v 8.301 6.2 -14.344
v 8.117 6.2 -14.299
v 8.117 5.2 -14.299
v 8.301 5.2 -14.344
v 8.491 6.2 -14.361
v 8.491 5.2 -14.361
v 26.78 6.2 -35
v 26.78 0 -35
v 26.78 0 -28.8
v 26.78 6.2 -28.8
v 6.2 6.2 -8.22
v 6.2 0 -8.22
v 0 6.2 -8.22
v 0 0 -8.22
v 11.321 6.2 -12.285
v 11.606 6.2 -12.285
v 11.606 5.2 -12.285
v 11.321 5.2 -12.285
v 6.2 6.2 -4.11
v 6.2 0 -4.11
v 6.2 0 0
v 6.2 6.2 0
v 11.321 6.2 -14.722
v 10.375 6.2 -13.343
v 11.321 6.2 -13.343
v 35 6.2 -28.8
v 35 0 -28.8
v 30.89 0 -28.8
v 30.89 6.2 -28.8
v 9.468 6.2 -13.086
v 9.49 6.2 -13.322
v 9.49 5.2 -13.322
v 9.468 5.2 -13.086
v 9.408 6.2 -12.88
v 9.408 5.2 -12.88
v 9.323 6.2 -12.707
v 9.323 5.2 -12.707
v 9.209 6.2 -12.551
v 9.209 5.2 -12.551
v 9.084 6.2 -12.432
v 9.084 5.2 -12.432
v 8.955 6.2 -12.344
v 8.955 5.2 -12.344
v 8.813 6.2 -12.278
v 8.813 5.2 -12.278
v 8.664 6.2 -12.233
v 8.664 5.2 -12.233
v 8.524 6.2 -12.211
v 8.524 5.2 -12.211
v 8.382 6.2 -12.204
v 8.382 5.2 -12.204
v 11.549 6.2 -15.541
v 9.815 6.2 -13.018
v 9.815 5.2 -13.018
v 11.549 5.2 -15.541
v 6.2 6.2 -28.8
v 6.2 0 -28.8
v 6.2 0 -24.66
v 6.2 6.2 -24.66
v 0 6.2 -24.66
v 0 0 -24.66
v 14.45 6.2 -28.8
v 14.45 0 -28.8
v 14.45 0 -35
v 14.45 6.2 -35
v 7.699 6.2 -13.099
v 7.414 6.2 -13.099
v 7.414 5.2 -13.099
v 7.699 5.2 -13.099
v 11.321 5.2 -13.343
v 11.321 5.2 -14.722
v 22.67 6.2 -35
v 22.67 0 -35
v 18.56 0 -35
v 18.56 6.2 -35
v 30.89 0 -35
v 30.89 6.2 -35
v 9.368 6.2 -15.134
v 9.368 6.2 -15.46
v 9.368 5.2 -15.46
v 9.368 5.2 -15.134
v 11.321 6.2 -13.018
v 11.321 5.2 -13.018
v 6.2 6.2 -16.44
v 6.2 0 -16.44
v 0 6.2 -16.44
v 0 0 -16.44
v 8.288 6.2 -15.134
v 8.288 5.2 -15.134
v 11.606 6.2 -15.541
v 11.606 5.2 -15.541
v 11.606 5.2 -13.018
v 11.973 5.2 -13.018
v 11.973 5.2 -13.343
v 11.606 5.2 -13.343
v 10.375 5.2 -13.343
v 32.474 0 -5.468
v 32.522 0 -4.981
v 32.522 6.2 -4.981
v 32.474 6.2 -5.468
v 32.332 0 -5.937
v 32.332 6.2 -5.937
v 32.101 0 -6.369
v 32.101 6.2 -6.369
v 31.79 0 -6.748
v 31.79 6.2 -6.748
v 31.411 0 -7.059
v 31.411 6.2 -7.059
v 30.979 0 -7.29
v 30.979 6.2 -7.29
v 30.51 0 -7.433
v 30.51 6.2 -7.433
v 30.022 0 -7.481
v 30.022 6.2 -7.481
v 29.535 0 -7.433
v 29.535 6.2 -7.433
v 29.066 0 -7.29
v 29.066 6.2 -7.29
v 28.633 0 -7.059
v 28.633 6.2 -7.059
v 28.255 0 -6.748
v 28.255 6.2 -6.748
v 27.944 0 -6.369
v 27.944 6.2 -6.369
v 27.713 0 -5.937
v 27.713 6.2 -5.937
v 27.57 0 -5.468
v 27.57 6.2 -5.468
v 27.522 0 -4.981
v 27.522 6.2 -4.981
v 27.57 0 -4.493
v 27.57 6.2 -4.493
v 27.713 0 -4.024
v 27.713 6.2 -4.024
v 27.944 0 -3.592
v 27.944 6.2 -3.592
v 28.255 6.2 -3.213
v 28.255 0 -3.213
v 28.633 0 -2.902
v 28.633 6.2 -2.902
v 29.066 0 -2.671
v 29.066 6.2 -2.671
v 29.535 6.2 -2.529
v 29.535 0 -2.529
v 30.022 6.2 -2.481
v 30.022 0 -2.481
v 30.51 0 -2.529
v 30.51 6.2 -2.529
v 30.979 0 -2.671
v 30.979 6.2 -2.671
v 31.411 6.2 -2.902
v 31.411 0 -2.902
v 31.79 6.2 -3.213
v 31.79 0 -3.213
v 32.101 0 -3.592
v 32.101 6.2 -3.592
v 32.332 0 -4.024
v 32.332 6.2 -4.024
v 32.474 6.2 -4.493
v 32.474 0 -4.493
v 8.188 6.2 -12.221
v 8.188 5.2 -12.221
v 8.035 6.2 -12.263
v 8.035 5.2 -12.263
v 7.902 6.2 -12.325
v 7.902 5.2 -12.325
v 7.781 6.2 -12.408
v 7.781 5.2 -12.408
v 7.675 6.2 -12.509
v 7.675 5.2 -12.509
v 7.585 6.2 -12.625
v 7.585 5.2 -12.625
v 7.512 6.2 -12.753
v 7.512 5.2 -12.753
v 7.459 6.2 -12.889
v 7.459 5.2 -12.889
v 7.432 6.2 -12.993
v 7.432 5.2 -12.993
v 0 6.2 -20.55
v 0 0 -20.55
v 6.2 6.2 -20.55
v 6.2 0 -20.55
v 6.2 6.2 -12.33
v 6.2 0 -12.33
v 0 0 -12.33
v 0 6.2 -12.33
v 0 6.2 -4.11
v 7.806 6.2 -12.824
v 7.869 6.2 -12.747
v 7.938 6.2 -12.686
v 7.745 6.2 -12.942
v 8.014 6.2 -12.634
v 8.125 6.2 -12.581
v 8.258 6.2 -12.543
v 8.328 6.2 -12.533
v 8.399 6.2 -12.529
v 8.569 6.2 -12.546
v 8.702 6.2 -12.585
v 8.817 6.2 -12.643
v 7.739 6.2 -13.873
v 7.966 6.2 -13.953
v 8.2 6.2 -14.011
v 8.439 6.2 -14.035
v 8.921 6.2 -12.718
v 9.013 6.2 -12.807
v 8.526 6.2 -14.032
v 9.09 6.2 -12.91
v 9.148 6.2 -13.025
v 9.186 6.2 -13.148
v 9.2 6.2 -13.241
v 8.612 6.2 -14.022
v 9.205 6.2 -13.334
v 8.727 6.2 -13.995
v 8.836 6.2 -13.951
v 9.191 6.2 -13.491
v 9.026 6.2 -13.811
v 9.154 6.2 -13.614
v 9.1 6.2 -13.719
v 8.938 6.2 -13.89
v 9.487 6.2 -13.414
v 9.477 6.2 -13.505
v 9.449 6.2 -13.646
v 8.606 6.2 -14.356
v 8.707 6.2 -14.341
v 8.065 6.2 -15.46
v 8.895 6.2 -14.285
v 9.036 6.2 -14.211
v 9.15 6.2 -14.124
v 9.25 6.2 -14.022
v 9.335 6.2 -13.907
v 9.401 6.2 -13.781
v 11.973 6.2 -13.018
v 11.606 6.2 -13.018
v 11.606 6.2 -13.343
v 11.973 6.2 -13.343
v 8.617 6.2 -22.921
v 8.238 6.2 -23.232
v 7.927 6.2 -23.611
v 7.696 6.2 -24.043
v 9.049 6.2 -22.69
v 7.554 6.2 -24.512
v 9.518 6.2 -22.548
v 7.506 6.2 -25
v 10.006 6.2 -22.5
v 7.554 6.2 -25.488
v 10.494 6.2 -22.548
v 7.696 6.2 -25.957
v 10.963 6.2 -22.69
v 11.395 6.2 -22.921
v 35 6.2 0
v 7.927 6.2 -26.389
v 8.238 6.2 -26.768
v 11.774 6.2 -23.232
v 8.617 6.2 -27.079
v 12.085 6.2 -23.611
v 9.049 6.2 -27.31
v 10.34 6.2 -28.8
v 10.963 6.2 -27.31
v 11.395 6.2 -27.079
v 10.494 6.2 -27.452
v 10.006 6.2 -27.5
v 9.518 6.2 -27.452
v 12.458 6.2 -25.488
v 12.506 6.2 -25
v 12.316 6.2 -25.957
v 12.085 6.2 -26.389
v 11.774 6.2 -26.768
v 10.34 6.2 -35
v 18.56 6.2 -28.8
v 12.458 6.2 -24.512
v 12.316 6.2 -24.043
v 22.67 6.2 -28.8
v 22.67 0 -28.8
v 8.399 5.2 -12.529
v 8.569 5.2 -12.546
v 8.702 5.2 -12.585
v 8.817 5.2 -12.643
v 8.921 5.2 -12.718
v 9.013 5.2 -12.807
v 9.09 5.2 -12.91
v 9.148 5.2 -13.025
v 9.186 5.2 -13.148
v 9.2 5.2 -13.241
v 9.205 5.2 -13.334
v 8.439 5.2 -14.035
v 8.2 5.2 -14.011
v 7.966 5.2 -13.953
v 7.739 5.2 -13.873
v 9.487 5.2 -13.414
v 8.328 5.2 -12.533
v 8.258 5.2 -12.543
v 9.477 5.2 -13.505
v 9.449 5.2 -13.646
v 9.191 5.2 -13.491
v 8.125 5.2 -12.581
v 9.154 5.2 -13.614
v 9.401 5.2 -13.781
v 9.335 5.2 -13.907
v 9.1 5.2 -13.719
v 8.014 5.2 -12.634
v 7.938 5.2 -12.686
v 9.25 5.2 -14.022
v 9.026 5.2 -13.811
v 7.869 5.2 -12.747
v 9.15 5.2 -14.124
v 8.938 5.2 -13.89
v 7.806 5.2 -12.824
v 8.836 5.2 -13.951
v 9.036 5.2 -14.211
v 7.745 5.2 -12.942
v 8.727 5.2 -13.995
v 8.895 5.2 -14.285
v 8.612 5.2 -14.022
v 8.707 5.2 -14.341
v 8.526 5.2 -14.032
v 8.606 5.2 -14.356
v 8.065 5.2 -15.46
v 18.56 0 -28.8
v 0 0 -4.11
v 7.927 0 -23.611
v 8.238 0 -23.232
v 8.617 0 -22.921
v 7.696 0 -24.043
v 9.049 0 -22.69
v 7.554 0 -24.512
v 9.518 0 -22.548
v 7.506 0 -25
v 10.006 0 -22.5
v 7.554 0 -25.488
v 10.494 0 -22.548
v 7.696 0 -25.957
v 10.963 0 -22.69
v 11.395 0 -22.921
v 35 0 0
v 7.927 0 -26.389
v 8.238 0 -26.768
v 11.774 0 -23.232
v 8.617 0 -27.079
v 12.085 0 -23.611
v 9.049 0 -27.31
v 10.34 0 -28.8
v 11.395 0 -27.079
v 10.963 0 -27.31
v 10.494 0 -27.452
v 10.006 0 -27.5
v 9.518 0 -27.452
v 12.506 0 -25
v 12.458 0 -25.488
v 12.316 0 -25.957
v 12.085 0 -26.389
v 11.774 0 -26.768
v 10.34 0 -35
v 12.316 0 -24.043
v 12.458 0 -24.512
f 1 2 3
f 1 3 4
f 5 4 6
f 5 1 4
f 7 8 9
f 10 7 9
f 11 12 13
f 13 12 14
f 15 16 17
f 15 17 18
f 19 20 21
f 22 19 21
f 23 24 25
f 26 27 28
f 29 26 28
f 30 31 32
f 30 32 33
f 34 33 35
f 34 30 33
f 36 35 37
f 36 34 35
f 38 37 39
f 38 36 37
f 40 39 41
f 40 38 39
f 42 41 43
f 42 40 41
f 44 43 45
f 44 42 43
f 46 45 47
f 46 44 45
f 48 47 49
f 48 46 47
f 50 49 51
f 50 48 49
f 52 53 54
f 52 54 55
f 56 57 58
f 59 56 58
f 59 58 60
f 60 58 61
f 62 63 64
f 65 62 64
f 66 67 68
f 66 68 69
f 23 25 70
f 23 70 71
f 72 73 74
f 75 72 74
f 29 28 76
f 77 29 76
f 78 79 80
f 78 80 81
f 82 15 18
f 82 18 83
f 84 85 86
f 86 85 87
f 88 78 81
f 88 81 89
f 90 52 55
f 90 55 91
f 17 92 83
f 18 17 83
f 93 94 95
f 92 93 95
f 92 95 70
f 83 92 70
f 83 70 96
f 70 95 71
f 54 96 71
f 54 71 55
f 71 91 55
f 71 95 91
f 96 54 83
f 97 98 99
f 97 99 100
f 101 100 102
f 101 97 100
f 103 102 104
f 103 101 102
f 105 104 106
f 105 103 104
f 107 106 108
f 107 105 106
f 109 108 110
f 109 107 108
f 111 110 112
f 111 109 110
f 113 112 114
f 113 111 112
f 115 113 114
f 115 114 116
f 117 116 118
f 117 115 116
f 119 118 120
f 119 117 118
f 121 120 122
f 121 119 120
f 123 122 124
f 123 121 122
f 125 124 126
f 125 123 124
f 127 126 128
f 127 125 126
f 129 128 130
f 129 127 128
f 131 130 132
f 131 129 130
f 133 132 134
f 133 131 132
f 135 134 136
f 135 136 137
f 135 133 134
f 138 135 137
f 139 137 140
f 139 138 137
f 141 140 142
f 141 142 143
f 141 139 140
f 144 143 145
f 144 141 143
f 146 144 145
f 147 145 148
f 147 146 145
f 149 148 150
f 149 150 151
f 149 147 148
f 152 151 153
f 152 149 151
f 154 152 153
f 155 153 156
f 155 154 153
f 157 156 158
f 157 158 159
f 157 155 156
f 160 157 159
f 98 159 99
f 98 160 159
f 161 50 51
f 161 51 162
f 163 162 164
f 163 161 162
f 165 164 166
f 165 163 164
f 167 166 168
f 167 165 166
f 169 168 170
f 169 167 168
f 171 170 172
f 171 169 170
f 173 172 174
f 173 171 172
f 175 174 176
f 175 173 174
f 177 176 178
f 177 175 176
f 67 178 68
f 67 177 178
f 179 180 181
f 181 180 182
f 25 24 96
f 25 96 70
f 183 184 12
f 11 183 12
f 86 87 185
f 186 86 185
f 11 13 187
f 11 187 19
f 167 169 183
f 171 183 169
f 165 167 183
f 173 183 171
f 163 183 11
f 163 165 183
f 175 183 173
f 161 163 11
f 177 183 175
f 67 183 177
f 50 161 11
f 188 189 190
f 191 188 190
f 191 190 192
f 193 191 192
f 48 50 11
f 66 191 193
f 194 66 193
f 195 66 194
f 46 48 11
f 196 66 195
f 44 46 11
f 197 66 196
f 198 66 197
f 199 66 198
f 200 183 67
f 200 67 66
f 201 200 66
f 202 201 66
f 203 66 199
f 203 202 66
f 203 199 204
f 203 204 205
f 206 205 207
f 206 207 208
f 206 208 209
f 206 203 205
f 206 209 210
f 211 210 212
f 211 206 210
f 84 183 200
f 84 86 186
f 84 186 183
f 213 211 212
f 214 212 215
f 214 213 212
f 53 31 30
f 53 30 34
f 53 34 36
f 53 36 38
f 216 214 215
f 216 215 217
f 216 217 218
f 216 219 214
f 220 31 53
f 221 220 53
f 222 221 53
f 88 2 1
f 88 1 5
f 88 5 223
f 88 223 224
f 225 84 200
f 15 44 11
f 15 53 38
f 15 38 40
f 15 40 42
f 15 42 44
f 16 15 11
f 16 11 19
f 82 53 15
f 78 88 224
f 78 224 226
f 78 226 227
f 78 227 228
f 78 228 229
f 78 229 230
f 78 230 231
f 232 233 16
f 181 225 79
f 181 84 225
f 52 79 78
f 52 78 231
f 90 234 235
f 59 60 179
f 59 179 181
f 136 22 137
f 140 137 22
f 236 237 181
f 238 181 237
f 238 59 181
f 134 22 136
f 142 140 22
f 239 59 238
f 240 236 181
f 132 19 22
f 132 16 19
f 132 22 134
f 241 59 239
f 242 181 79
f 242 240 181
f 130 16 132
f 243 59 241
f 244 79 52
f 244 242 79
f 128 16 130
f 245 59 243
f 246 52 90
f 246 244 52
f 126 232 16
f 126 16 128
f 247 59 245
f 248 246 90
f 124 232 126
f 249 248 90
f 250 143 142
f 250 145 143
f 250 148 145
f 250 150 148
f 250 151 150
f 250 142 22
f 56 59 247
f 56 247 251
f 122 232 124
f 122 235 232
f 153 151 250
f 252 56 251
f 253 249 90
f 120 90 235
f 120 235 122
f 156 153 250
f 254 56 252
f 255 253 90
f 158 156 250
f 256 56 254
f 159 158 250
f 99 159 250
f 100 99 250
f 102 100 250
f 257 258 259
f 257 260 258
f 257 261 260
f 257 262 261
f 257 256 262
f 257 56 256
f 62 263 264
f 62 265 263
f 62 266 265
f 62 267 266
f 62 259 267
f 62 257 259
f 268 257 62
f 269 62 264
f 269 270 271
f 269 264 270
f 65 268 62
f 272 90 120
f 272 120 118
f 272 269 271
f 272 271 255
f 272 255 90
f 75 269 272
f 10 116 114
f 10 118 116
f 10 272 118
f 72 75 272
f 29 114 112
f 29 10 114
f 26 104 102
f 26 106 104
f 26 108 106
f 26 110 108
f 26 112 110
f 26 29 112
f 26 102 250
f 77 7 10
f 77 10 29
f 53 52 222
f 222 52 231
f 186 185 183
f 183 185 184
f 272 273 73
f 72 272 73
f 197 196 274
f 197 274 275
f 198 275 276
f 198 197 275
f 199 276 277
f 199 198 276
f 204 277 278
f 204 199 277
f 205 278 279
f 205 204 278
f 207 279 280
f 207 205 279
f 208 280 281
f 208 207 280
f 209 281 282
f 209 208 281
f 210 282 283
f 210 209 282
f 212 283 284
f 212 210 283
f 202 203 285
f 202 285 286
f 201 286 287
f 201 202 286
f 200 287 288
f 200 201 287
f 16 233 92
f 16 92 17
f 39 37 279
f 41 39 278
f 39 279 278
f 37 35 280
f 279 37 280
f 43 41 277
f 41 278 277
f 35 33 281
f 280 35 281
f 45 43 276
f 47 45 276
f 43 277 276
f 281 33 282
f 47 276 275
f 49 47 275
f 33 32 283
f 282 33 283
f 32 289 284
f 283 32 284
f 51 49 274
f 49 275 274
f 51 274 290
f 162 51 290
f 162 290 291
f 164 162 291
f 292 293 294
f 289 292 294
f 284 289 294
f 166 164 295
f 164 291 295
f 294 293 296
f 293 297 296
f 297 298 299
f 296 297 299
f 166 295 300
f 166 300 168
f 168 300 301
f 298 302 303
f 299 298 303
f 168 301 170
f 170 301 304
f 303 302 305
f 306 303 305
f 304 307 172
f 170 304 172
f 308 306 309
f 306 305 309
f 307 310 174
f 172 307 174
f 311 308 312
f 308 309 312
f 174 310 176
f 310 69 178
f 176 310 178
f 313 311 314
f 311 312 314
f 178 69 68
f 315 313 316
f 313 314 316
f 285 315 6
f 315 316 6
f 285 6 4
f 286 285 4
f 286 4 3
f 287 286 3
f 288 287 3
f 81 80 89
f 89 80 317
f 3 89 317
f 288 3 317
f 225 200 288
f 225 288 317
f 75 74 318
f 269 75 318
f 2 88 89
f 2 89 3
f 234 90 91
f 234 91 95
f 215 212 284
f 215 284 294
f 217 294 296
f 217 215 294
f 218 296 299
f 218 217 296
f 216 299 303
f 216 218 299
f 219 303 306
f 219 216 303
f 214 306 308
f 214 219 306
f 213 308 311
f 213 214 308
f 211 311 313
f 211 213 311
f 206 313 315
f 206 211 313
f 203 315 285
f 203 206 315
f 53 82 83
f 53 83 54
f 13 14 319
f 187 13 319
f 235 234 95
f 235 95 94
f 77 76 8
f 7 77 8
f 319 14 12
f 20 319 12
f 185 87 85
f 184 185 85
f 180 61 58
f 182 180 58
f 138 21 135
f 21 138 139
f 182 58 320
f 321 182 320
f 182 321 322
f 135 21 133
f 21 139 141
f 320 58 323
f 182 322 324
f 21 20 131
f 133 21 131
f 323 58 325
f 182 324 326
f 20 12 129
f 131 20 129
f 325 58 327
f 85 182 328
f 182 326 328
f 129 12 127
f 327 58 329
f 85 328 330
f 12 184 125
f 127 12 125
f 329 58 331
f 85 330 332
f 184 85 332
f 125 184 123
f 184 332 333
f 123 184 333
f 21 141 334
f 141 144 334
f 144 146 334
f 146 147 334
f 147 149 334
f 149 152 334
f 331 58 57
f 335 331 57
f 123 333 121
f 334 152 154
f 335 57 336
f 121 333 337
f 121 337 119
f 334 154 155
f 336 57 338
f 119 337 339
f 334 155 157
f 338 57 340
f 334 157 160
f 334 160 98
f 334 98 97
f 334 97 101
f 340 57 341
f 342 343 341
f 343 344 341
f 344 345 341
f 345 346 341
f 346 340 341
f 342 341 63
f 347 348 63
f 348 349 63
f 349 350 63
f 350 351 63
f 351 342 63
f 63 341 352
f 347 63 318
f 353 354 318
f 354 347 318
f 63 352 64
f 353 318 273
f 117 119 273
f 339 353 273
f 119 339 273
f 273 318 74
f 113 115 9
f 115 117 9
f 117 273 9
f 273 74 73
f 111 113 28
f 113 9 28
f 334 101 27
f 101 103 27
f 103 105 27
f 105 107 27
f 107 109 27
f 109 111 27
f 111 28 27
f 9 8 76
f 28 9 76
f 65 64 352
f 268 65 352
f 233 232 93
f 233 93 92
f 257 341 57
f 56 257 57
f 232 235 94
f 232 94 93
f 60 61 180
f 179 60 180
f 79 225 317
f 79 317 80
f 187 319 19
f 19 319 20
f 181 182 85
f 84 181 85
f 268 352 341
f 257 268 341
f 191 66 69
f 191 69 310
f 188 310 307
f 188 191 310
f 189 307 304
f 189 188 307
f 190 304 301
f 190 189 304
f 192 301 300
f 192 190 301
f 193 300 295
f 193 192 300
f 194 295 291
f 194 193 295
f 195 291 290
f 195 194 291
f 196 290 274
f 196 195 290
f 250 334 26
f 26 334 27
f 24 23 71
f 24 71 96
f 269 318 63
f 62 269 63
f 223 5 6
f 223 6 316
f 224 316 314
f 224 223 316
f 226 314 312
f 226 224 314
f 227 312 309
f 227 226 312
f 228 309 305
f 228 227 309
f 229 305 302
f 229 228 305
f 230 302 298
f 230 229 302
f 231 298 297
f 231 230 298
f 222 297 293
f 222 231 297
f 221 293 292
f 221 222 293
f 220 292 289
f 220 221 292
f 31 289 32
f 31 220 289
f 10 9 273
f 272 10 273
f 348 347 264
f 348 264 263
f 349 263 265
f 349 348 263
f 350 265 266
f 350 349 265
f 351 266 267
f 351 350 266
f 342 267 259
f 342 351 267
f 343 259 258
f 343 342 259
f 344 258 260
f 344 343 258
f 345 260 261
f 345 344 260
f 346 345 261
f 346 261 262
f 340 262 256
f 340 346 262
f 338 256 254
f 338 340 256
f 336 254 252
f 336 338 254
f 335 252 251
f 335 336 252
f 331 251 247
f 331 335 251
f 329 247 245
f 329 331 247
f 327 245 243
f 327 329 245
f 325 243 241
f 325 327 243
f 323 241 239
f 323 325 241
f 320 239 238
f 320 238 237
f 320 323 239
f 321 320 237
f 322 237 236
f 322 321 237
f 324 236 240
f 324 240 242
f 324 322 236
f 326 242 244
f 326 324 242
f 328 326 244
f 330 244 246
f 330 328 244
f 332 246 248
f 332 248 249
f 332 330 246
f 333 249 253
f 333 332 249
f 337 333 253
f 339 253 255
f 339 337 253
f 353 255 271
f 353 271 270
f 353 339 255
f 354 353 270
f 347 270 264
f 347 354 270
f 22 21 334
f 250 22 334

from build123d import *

# Parameters (mm, degrees)
SKETCH1_R           = 2.5
BOSS_EXTRUDE1_DEPTH = 6.2
CUT_EXTRUDE1_DEPTH  = 1


with BuildPart() as part:
    # Sketch1 → Boss-Extrude1 (new body)
    with BuildSketch(Plane(origin=(0, 0, 0), x_dir=(1, 0, 0), z_dir=(0, 1, 0))):
        Polygon((0, 24.66), (0, 20.55), (6.2, 20.55), (6.2, 16.44), (0, 16.44), (0, 12.33), (6.2, 12.33), (6.2, 8.22), (0, 8.22), (0, 4.11), (6.2, 4.11), (6.2, 0), (17, 0), (35, 0), (35, 18), (35, 28.8), (30.89, 28.8), (30.89, 35), (26.78, 35), (26.78, 28.8), (22.67, 28.8), (22.67, 35), (18.56, 35), (18.56, 28.8), (14.45, 28.8), (14.45, 35), (10.34, 35), (10.34, 28.8), (6.2, 28.8), (6.2, 24.66), align=None)
        with Locations((10.006, 25)):
            Circle(SKETCH1_R, mode=Mode.SUBTRACT)
        with Locations((30.02235364, 4.980572344)):
            Circle(SKETCH1_R, mode=Mode.SUBTRACT)
    extrude(amount=BOSS_EXTRUDE1_DEPTH)

    # Sketch2 → Cut-Extrude1 (cut)
    with BuildSketch(Plane(origin=(0, 6.2, 0), x_dir=(1, 0, 0), z_dir=(0, 1, 0))):
        with BuildLine():
            Line((9.367624272, 15.46006193), (9.367624272, 15.134420905))
            Line((9.367624272, 15.134420905), (8.28766634, 15.134420905))
            Line((8.28766634, 15.134420905), (8.116577598, 14.299329759))
            add(Edge.make_bspline(
                [(8.116577598, 14.299329759), (8.150192569, 14.308610077), (8.215316261, 14.326589225), (8.311436992, 14.346551603), (8.40268849, 14.358585256), (8.461902576, 14.360228373), (8.490555963, 14.361023469)],
                knots=[0, 0, 0, 0, 0.000104595, 0.000202637, 0.000294305, 0.000380252, 0.000380252, 0.000380252, 0.000380252], degree=3))
            add(Edge.make_bspline(
                [(8.490555963, 14.361023469), (8.526010498, 14.360256084), (8.595722973, 14.358747215), (8.697721161, 14.344258466), (8.795087428, 14.321452972), (8.88761815, 14.289593641), (8.975484506, 14.248854097), (9.05787808, 14.197963437), (9.136035615, 14.138515344), (9.208554968, 14.070166655), (9.274344876, 13.994944902), (9.332189738, 13.914065976), (9.381322945, 13.828315883), (9.420838773, 13.736875331), (9.452393133, 13.640755241), (9.4733953, 13.538944256), (9.487380458, 13.432402033), (9.488942908, 13.359554316), (9.489739657, 13.322406682)],
                knots=[0, 0, 0, 0, 0.000106308, 0.000209029, 0.000308378, 0.000405929, 0.000502102, 0.000598312, 0.00069588, 0.000796219, 0.000896736, 0.000995218, 0.001094066, 0.001192613, 0.001293582, 0.001396995, 0.001504047, 0.001615439, 0.001615439, 0.001615439, 0.001615439], degree=3))
            add(Edge.make_bspline(
                [(9.489739657, 13.322406682), (9.489136339, 13.296532954), (9.487937855, 13.245135158), (9.481843137, 13.168804347), (9.470108594, 13.094089491), (9.454353587, 13.020980679), (9.433904394, 12.94961632), (9.409149323, 12.879792148), (9.378854356, 12.811942755), (9.345624465, 12.745426146), (9.308208017, 12.681746072), (9.266680371, 12.622193063), (9.222805961, 12.56587375), (9.17559699, 12.51339215), (9.124614659, 12.465093126), (9.070476403, 12.420690042), (9.013614223, 12.379431978), (8.953148396, 12.342993687), (8.890426286, 12.309463005), (8.824542118, 12.281955225), (8.756995625, 12.257362103), (8.686814631, 12.237759175), (8.614158101, 12.222398929), (8.538906269, 12.211966241), (8.461453804, 12.204367616), (8.4089529, 12.203891949), (8.382432966, 12.203651674)],
                knots=[0, 0, 0, 0, 7.7636e-05, 0.000154223, 0.000229512, 0.000304362, 0.000378447, 0.000452077, 0.000526407, 0.000601214, 0.00067506, 0.000747747, 0.00081887, 0.000889121, 0.000959302, 0.001029336, 0.001099058, 0.00116985, 0.001240974, 0.00131221, 0.00138383, 0.001456517, 0.001530612, 0.001606437, 0.001684346, 0.001763871, 0.001763871, 0.001763871, 0.001763871], degree=3))
            add(Edge.make_bspline(
                [(8.382432966, 12.203651674), (8.350797102, 12.204278363), (8.288557277, 12.205511299), (8.197370763, 12.218409496), (8.109636799, 12.236882477), (8.026061636, 12.264673951), (7.945896275, 12.299496711), (7.870219953, 12.343507809), (7.797098999, 12.393381711), (7.729505937, 12.452237459), (7.666771462, 12.516568114), (7.610613415, 12.586379688), (7.560599385, 12.660519968), (7.517530286, 12.739349008), (7.480792795, 12.822659675), (7.451932056, 12.910764112), (7.428638119, 13.003201972), (7.418783445, 13.066841228), (7.413778118, 13.099164495)],
                knots=[0, 0, 0, 0, 9.4843e-05, 0.000186593, 0.000275792, 0.000363484, 0.000450342, 0.000537514, 0.000625728, 0.000715478, 0.000805885, 0.000894984, 0.00098389, 0.001073836, 0.001164117, 0.001256635, 0.001351658, 0.001449737, 0.001449737, 0.001449737, 0.001449737], degree=3))
            Line((7.413778118, 13.099164495), (7.698714016, 13.099164495))
            add(Edge.make_bspline(
                [(7.698714016, 13.099164495), (7.705724921, 13.068887284), (7.719200271, 13.010692804), (7.748778343, 12.928930802), (7.784942388, 12.856069792), (7.827944904, 12.791145956), (7.87924386, 12.73453208), (7.93778127, 12.684079459), (8.003410991, 12.638563449), (8.076339135, 12.600624224), (8.153276714, 12.56826757), (8.233801254, 12.546721389), (8.315720197, 12.531571293), (8.371127004, 12.530054768), (8.398969424, 12.5292927)],
                knots=[0, 0, 0, 0, 9.3172e-05, 0.000179081, 0.000260145, 0.000336703, 0.000411917, 0.000488562, 0.000568128, 0.000650923, 0.00073478, 0.000817953, 0.000900557, 0.000983994, 0.000983994, 0.000983994, 0.000983994], degree=3))
            add(Edge.make_bspline(
                [(8.398969424, 12.5292927), (8.426146013, 12.530037262), (8.479656939, 12.531503313), (8.558407269, 12.542787274), (8.634437519, 12.560165928), (8.706997478, 12.586173582), (8.777356875, 12.617782719), (8.843735938, 12.658345681), (8.908054976, 12.705027269), (8.968314783, 12.758509355), (9.023504855, 12.817446149), (9.072269336, 12.880472071), (9.112888394, 12.947706638), (9.147118621, 13.017985856), (9.173111256, 13.092079975), (9.191654146, 13.169641756), (9.202542635, 13.250862773), (9.204040492, 13.306261362), (9.204803759, 13.334491017)],
                knots=[0, 0, 0, 0, 8.15e-05, 0.000160473, 0.000238226, 0.000315066, 0.000391338, 0.000469218, 0.000547964, 0.000629516, 0.000710512, 0.000789892, 0.000868102, 0.000945761, 0.001024012, 0.00110315, 0.001184644, 0.001269321, 0.001269321, 0.001269321, 0.001269321], degree=3))
            add(Edge.make_bspline(
                [(9.204803759, 13.334491017), (9.204206424, 13.359959735), (9.203037226, 13.409811125), (9.193484495, 13.482744691), (9.176868384, 13.551753808), (9.153805293, 13.61717172), (9.124523168, 13.679060129), (9.088739728, 13.737482905), (9.045783431, 13.791670025), (8.996714361, 13.841646841), (8.942958852, 13.887770406), (8.883592028, 13.927089685), (8.819856238, 13.960167667), (8.752519387, 13.988713637), (8.6799798, 14.009215742), (8.603673998, 14.024608038), (8.522777984, 14.033511974), (8.46746886, 14.034747402), (8.439038535, 14.035382443)],
                knots=[0, 0, 0, 0, 7.6388e-05, 0.000149519, 0.000220172, 0.000288967, 0.000357247, 0.000425206, 0.000494043, 0.000564207, 0.000635056, 0.000706145, 0.000777268, 0.000850264, 0.000925136, 0.001002969, 0.001083601, 0.001168886, 0.001168886, 0.001168886, 0.001168886], degree=3))
            add(Edge.make_bspline(
                [(8.439038535, 14.035382443), (8.414428721, 14.034855764), (8.363615699, 14.033768305), (8.28567142, 14.025761412), (8.203763929, 14.012844338), (8.118207208, 13.995076813), (8.028744318, 13.971825765), (7.935564055, 13.943963325), (7.838470499, 13.910651226), (7.77304942, 13.885494147), (7.739419144, 13.87256193)],
                knots=[0, 0, 0, 0, 7.3822e-05, 0.000152423, 0.000234822, 0.000322511, 0.00041445, 0.000512043, 0.000614219, 0.000722306, 0.000722306, 0.000722306, 0.000722306], degree=3))
            Line((7.739419144, 13.87256193), (8.06506017, 15.46006193))
            Line((8.06506017, 15.46006193), (9.367624272, 15.46006193))
        make_face()
        Polygon((11.548528719, 15.541472187), (11.606406324, 15.541472187), (11.606406324, 13.343395264), (11.972752477, 13.343395264), (11.972752477, 13.017754238), (11.606406324, 13.017754238), (11.606406324, 12.28506193), (11.321470426, 12.28506193), (11.321470426, 13.017754238), (9.815380682, 13.017754238), align=None)
        Polygon((11.321470426, 13.343395264), (11.321470426, 14.722281482), (10.375076195, 13.343395264), align=None, mode=Mode.SUBTRACT)
    extrude(amount=-CUT_EXTRUDE1_DEPTH, mode=Mode.SUBTRACT)


solid = part.part
